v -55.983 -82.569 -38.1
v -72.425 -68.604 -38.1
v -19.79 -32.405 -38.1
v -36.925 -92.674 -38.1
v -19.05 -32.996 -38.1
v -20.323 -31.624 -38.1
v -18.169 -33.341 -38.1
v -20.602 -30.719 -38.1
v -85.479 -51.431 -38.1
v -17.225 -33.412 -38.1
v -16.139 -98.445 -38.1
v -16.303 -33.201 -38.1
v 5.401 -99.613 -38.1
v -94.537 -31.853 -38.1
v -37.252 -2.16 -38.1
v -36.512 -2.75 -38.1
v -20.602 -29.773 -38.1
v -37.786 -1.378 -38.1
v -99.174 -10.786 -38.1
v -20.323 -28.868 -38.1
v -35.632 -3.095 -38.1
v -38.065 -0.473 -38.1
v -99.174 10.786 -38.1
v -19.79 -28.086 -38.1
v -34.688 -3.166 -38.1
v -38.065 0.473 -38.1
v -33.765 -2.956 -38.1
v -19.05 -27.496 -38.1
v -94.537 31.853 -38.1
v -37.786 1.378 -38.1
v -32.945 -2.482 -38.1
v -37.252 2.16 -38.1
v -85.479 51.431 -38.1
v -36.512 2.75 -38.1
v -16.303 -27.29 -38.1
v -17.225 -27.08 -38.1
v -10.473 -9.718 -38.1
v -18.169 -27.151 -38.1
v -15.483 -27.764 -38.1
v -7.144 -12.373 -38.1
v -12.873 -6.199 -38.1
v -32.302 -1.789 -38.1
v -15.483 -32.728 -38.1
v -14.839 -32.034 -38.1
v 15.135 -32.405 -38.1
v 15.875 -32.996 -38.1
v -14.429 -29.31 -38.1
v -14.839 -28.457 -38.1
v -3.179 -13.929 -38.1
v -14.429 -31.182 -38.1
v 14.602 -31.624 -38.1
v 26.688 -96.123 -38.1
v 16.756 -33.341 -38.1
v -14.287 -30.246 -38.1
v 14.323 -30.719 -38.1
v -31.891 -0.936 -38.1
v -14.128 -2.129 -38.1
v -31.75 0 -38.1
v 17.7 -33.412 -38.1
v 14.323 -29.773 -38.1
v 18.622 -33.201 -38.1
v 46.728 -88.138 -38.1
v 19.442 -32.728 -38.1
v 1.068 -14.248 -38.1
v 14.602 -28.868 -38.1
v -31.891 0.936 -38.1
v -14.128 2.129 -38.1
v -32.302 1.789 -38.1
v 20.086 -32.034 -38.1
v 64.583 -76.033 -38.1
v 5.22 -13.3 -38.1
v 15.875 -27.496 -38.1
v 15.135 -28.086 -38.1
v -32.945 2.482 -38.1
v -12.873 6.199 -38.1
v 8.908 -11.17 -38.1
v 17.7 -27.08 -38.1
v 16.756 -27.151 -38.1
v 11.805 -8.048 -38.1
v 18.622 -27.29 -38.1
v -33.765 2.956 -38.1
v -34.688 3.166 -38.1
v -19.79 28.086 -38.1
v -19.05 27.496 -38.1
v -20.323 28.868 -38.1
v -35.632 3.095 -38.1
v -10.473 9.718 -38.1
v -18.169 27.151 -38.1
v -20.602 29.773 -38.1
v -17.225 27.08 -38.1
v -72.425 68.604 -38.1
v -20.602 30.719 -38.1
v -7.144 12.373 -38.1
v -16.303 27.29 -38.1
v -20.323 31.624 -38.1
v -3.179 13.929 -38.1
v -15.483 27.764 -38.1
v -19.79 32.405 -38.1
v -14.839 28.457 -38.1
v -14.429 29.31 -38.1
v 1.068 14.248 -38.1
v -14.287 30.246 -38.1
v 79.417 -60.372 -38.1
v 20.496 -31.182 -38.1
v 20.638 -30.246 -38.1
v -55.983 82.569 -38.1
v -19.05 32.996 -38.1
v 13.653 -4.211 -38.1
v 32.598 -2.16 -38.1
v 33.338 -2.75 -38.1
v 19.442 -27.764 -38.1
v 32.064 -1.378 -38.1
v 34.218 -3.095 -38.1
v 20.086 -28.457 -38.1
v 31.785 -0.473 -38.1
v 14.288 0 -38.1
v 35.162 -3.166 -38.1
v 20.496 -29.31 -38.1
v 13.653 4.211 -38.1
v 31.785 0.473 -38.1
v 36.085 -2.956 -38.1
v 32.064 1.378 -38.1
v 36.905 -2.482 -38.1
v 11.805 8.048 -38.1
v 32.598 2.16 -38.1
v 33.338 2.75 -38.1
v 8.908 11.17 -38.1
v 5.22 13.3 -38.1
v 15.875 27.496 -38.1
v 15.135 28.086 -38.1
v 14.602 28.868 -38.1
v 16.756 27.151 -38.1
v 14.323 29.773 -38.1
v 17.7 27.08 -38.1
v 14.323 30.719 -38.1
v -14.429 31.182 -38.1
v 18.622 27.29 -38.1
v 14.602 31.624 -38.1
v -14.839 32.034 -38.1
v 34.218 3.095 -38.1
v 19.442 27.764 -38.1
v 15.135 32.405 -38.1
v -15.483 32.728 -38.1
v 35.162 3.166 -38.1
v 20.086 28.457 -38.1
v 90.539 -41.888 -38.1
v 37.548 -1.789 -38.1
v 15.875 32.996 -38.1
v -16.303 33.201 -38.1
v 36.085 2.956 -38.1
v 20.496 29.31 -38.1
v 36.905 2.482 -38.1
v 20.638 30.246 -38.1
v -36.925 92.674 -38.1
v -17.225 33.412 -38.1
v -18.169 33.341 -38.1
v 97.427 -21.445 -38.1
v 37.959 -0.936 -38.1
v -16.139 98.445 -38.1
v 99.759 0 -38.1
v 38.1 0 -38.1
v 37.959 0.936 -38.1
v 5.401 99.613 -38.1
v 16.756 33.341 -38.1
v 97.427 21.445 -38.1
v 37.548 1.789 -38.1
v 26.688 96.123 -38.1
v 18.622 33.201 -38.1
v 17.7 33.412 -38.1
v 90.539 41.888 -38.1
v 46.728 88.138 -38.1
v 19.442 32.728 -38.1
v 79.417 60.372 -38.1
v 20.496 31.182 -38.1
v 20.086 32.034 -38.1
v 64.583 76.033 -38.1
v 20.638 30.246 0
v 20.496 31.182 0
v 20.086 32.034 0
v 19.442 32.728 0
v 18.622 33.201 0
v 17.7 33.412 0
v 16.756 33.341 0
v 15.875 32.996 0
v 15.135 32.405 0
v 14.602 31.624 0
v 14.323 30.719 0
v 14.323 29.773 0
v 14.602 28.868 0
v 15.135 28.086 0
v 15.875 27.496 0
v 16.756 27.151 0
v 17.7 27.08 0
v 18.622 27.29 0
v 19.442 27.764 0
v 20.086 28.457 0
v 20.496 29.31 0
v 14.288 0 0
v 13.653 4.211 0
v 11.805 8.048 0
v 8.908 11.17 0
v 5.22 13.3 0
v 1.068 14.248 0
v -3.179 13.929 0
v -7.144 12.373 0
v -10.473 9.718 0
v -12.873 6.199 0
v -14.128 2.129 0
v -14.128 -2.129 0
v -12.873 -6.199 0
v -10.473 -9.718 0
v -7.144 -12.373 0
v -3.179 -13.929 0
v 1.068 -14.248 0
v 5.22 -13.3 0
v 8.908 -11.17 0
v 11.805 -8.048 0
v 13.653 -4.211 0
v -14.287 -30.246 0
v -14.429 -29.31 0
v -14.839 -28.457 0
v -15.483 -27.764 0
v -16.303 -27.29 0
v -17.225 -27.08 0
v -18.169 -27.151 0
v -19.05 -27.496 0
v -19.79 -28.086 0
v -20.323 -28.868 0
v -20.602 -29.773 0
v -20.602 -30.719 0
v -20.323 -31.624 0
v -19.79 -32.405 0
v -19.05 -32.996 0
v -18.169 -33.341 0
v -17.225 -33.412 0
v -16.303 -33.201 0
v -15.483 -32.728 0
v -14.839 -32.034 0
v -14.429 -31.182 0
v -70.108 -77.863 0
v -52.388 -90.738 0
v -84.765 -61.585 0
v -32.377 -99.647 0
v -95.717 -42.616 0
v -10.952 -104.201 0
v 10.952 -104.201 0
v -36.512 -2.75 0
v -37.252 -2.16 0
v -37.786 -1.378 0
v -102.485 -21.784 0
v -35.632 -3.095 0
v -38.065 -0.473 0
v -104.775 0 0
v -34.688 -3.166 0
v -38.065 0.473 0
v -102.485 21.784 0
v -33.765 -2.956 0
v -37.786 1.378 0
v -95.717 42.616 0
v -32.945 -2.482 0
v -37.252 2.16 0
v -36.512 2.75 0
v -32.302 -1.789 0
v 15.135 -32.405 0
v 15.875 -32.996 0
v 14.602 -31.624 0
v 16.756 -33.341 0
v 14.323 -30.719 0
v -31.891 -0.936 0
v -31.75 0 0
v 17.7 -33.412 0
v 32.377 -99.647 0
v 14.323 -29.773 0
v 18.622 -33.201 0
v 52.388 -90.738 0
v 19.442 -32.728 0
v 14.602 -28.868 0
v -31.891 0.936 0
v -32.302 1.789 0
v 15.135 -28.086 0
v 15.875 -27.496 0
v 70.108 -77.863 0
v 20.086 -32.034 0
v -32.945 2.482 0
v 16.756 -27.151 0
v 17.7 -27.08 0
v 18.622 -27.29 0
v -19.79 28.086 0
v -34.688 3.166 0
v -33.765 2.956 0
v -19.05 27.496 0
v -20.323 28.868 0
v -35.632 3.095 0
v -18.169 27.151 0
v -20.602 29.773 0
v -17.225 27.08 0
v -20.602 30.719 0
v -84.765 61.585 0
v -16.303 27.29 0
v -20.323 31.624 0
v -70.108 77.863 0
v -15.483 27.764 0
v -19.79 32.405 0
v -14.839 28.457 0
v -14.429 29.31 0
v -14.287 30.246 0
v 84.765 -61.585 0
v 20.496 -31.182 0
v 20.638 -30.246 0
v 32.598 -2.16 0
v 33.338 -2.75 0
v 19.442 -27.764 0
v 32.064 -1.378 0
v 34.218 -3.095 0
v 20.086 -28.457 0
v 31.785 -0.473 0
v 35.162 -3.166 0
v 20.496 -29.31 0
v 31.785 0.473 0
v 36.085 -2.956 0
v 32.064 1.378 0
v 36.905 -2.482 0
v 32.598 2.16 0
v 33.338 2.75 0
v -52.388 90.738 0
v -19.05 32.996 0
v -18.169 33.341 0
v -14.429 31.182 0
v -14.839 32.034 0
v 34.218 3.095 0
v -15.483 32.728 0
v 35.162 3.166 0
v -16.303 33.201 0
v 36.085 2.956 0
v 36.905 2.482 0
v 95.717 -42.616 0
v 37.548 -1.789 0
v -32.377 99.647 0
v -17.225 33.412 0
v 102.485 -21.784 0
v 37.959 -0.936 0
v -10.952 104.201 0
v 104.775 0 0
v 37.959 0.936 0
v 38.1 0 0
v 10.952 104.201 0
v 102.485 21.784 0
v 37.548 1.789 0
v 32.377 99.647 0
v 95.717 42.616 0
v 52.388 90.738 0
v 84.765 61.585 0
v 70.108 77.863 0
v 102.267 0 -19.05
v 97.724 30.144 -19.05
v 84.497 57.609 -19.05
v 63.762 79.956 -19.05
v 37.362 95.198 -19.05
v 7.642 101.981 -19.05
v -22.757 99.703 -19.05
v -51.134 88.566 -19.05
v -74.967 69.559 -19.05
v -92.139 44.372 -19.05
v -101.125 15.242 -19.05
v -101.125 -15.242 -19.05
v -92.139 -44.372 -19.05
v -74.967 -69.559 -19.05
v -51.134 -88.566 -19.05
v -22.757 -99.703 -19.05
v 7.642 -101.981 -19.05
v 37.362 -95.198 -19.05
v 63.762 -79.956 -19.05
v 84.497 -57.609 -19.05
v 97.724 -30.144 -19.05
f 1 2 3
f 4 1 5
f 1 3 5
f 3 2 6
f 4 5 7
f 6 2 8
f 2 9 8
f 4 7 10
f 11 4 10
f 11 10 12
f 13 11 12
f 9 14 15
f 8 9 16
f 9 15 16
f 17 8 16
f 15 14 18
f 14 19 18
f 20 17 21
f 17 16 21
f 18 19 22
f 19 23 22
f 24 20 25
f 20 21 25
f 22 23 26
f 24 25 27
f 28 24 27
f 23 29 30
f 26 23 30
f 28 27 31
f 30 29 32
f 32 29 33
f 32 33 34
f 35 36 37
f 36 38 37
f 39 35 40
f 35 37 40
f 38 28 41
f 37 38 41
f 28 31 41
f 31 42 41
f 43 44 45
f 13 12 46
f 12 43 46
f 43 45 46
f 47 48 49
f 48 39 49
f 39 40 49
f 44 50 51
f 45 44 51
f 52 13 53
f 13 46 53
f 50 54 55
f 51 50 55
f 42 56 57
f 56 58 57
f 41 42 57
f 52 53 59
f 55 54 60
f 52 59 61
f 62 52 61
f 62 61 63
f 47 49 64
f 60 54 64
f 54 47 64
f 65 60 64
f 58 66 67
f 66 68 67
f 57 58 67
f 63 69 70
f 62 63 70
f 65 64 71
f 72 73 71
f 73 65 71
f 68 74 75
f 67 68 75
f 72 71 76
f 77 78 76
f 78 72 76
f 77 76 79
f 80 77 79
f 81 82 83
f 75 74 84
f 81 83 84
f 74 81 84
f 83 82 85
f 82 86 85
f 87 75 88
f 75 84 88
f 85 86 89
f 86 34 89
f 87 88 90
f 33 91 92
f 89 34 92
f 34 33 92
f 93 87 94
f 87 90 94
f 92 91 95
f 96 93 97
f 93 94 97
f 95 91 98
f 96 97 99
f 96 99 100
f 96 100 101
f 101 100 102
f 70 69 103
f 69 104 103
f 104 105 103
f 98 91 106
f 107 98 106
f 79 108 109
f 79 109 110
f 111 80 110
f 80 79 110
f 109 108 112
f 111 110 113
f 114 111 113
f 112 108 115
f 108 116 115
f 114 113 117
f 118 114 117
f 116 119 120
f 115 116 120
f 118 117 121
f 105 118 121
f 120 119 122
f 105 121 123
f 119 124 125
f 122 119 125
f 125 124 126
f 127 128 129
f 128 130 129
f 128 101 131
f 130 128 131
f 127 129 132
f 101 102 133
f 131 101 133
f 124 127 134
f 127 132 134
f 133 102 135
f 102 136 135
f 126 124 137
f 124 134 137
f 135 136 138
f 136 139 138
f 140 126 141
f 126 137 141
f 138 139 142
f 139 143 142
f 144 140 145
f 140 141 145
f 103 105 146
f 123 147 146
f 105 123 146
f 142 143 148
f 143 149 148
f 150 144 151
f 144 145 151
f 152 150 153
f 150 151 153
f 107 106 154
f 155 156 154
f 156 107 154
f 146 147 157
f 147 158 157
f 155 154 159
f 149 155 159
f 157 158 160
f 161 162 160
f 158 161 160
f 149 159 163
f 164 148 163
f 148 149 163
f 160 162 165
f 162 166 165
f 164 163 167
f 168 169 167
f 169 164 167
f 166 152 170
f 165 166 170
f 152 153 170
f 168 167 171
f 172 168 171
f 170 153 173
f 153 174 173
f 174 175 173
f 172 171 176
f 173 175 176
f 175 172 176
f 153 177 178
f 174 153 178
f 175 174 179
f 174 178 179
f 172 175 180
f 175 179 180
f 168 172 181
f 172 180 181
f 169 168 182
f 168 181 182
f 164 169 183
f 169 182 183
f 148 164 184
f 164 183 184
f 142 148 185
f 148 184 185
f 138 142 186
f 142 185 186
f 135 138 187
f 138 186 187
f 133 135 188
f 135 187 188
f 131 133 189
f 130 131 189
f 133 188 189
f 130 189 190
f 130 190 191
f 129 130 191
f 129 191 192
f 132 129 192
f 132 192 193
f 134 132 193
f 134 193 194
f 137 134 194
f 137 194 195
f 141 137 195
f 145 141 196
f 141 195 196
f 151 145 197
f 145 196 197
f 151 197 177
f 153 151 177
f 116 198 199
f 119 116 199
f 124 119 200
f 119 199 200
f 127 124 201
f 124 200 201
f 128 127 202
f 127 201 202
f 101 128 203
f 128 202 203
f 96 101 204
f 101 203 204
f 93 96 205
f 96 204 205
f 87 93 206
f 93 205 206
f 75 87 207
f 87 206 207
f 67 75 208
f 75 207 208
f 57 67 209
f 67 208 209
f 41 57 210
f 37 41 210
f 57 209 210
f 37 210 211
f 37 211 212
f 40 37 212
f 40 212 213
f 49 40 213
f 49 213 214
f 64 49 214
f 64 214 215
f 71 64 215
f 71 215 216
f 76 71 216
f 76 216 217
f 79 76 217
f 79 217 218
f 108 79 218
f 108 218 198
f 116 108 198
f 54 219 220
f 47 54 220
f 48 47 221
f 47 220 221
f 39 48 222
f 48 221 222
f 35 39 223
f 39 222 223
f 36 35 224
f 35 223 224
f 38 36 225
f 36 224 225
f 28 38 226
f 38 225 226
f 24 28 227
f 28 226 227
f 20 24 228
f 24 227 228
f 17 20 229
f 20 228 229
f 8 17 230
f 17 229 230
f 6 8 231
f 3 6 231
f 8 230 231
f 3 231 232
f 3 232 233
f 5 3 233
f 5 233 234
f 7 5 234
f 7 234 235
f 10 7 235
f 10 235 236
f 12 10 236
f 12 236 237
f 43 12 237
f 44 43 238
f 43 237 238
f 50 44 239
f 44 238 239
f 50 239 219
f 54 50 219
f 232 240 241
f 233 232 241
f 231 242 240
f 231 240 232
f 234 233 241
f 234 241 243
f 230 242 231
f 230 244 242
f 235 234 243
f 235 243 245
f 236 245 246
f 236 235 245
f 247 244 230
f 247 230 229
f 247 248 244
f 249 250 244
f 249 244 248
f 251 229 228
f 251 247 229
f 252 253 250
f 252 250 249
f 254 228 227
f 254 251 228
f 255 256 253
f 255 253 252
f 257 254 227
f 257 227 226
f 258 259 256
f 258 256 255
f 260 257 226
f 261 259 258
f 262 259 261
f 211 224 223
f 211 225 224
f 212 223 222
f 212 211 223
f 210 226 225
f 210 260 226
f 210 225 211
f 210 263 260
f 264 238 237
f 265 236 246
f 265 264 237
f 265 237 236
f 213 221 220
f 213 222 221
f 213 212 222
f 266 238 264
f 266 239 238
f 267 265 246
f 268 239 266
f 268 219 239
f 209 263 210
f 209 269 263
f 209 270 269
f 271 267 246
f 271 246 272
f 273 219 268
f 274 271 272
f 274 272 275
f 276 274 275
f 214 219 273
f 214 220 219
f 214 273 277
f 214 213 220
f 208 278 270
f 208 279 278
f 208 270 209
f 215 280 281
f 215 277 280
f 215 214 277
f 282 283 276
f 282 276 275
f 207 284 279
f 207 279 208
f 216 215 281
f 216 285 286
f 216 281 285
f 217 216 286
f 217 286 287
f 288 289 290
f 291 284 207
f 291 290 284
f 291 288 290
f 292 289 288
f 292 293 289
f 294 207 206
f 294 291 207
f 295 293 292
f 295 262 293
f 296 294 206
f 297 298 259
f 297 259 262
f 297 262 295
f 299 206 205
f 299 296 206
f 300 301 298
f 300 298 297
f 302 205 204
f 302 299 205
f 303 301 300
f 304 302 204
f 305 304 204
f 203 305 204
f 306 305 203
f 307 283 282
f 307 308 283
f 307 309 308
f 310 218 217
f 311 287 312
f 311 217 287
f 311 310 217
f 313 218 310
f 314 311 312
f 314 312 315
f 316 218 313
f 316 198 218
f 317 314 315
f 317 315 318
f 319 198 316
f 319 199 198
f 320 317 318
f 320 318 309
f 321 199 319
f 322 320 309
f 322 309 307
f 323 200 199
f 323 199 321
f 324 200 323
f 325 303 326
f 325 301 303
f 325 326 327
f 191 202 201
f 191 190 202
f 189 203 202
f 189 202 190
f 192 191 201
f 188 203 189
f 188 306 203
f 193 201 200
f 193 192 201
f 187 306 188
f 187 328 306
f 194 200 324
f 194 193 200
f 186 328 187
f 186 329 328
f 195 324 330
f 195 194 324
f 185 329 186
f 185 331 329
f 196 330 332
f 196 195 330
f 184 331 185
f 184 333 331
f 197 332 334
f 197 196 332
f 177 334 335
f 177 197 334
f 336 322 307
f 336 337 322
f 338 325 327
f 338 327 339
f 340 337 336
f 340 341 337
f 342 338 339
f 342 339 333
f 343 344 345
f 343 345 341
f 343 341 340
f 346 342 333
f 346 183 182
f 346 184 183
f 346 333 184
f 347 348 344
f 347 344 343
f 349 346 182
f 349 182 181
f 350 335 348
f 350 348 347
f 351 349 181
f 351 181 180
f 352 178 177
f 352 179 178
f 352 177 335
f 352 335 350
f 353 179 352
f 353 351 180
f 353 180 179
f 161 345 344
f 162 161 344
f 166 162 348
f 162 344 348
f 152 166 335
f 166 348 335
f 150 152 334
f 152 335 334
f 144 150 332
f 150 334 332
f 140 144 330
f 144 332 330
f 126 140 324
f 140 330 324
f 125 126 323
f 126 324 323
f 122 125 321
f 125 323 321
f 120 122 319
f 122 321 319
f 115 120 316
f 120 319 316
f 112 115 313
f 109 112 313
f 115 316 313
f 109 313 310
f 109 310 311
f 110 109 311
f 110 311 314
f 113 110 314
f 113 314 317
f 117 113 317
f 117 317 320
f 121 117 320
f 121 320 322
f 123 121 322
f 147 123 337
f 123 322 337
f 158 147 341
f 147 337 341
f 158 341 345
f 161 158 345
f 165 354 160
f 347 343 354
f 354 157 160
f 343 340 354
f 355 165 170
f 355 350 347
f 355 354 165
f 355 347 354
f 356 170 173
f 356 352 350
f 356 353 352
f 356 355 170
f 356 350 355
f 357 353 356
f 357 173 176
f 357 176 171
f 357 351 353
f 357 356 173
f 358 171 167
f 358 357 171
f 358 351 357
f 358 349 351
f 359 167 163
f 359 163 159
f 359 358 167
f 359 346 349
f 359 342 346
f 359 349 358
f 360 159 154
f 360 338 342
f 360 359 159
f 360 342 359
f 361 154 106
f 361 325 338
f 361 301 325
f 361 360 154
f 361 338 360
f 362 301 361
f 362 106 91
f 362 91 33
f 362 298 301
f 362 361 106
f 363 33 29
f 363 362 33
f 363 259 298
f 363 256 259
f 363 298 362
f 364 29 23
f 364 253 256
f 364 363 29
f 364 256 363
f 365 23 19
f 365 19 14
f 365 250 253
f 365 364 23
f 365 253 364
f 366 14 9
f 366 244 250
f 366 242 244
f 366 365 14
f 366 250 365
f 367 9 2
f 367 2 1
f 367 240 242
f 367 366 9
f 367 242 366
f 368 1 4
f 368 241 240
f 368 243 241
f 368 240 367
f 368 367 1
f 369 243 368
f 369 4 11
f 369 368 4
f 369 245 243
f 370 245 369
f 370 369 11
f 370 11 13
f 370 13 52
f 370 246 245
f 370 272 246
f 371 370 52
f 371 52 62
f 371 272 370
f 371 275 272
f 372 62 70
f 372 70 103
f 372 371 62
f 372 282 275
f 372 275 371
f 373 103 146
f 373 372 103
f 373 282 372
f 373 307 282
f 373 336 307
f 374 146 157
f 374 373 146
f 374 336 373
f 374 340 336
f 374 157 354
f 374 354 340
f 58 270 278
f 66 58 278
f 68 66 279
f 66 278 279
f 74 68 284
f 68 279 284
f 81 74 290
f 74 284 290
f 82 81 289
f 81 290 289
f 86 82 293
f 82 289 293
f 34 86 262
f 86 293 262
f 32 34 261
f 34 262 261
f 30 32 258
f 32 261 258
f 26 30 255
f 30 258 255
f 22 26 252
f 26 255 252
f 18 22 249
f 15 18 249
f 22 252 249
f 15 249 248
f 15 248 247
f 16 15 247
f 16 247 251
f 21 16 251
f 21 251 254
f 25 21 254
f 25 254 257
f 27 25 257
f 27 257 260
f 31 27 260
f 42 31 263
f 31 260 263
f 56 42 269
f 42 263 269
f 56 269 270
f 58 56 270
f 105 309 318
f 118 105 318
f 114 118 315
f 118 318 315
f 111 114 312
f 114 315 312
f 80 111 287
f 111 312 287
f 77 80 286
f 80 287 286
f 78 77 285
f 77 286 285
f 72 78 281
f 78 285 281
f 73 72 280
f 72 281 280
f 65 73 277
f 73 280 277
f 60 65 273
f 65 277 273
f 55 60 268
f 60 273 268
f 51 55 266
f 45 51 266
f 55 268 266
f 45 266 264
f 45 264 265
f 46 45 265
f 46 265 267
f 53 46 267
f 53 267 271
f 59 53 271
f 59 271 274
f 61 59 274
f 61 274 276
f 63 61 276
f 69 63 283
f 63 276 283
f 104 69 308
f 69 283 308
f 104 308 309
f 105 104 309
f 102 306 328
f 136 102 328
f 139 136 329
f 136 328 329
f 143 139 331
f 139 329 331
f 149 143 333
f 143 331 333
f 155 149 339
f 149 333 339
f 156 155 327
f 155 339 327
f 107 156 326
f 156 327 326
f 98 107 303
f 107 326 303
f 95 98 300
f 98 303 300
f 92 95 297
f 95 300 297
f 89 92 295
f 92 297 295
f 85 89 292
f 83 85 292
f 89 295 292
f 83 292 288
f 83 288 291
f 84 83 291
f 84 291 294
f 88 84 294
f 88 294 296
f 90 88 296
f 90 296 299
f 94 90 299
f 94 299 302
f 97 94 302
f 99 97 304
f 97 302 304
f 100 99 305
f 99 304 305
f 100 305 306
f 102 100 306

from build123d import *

# Parameters (mm, degrees)
SKETCH1_R           = 104.775
BOSS_EXTRUDE1_DEPTH = 38.1
BOSS_EXTRUDE1_DRAFT = -7.5
SKETCH2_R           = 14.2875
CUT_EXTRUDE1_DEPTH  = 153.9941543
SKETCH3_R           = 3.175
CUT_EXTRUDE2_DEPTH  = 38.1


with BuildPart() as part:
    # Sketch1 → Boss-Extrude1 (with draft: the straight prism first)
    with BuildSketch(Plane.XY):
        Circle(SKETCH1_R)
    extrude(amount=-BOSS_EXTRUDE1_DEPTH)
    # Boss-Extrude1: the draft: its side faces are tilted about the plane it starts from
    boss_extrude1_sides = [part.faces().sort_by_distance(p)[0] for p in [
        (-104.775, 0, -19.05),
    ]]
    draft(boss_extrude1_sides, Plane.XY, BOSS_EXTRUDE1_DRAFT)

    # Sketch2 → Cut-Extrude1 (cut, through all)
    with BuildSketch(Plane.XY):
        Circle(SKETCH2_R)
    extrude(amount=-CUT_EXTRUDE1_DEPTH, mode=Mode.SUBTRACT)

    # Sketch3 → Cut-Extrude2 (cut)
    with BuildSketch(Plane.XY):
        with Locations((34.925, 0)):
            Circle(SKETCH3_R)
        with Locations((17.4625, -30.245937227)):
            Circle(SKETCH3_R)
        with Locations((-17.4625, -30.245937227)):
            Circle(SKETCH3_R)
        with Locations((-34.925, 0)):
            Circle(SKETCH3_R)
        with Locations((-17.4625, 30.245937227)):
            Circle(SKETCH3_R)
        with Locations((17.4625, 30.245937227)):
            Circle(SKETCH3_R)
    extrude(amount=-CUT_EXTRUDE2_DEPTH, mode=Mode.SUBTRACT)


solid = part.part
